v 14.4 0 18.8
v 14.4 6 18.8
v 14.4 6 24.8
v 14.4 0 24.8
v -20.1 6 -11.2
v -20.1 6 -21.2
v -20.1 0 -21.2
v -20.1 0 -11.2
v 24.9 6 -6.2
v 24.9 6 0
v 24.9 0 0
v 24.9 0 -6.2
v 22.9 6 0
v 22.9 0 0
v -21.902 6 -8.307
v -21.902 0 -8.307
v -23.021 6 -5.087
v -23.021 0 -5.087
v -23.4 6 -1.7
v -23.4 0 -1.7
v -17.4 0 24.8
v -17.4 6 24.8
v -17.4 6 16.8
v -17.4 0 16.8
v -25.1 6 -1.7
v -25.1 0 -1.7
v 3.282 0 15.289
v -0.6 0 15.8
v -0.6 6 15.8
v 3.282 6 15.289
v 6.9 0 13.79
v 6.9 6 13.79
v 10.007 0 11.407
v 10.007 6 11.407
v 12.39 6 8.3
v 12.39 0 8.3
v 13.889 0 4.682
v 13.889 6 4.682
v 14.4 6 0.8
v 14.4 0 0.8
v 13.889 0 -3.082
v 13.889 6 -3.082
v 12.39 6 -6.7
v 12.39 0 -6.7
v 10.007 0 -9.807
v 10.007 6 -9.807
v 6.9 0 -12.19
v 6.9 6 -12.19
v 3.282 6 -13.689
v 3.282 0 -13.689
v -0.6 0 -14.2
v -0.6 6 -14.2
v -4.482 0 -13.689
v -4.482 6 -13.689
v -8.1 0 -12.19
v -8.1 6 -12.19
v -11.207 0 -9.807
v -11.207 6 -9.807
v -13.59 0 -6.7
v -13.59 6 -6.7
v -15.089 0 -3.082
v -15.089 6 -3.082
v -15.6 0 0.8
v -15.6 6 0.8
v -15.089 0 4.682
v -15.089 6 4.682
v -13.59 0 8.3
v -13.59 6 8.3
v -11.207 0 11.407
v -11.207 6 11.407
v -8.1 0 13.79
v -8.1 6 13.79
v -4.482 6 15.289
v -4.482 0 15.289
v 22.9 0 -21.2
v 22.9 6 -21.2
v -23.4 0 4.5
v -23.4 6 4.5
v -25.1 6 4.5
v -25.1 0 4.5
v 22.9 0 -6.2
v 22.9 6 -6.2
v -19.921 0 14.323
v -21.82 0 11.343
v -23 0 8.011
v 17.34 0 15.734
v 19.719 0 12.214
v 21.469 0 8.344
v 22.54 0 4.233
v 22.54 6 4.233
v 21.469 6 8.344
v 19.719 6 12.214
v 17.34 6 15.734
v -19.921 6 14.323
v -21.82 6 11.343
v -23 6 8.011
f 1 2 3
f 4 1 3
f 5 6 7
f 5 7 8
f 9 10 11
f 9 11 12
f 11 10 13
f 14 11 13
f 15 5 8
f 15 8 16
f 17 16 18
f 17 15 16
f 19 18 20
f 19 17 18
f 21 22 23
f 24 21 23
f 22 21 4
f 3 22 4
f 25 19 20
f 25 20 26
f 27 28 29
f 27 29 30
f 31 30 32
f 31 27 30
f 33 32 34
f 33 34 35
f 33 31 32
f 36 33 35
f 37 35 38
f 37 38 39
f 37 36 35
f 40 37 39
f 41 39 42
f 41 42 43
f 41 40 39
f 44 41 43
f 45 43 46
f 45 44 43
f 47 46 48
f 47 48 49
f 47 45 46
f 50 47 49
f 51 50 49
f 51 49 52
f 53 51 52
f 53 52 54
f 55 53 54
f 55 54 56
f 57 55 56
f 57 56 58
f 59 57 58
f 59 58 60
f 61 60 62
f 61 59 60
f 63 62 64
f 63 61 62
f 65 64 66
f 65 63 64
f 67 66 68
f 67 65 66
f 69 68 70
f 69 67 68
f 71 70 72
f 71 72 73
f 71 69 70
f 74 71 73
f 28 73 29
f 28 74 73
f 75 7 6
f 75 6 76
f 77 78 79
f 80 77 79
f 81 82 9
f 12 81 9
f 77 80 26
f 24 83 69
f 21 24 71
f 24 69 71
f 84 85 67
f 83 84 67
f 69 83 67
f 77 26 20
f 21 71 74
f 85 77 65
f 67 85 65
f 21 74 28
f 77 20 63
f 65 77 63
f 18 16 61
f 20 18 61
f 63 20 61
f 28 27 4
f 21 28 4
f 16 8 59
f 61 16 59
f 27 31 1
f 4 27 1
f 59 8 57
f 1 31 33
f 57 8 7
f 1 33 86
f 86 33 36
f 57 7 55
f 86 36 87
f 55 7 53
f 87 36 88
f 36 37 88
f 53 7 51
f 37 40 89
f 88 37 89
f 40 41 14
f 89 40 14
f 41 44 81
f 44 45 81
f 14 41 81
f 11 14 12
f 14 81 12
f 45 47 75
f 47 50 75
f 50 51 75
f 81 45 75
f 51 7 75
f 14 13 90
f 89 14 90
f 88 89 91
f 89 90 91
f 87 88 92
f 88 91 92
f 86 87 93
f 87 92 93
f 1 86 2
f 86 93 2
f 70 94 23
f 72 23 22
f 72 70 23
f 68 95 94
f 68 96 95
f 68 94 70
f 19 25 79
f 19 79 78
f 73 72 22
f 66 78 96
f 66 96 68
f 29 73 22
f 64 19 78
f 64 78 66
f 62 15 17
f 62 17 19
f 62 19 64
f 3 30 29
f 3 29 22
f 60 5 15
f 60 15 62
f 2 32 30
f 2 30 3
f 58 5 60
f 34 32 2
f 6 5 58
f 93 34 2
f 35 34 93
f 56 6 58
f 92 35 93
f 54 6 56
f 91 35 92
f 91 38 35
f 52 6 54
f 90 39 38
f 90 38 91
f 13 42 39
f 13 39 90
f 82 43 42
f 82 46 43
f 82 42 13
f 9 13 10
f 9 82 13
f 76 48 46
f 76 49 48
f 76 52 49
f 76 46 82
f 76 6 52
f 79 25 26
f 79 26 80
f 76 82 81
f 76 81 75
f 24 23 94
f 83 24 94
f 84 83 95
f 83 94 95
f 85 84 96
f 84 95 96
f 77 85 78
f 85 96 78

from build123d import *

# Parameters (mm, degrees)
SKETCH1_W           = 62.8
SKETCH1_H           = 46
SKETCH1_R           = 1.4
SKETCH1_R_2         = 15
BOSS_EXTRUDE1_DEPTH = 6
SKETCH2_W           = 8.5
SKETCH2_H           = 15
CUT_EXTRUDE1_DEPTH  = 41.459856648
FILLET1_R           = 3.1
CUT_EXTRUDE2_DEPTH  = 41.459856648


with BuildPart() as part:
    # Sketch1 → Boss-Extrude1 (new body)
    with BuildSketch(Plane(origin=(0, 0, 0), x_dir=(1, 0, 0), z_dir=(0, 1, 0))):
        with Locations((0, -1.8)):
            Rectangle(SKETCH1_W, SKETCH1_H)
        with Locations(Location((-28.3, -1.4, 0), (0, 0, 270))):
            Circle(SKETCH1_R, mode=Mode.SUBTRACT)
        with Locations(Location((28.3, 3.1, 0), (0, 0, 270))):
            Circle(SKETCH1_R, mode=Mode.SUBTRACT)
        with Locations(Location((-0.6, -0.8, 0), (0, 0, 270))):
            Circle(SKETCH1_R_2, mode=Mode.SUBTRACT)
    extrude(amount=BOSS_EXTRUDE1_DEPTH)

    # Sketch2 → Cut-Extrude1 (cut, through all)
    with BuildSketch(Plane(origin=(0, 6, 0), x_dir=(1, 0, 0), z_dir=(0, 1, 0))):
        with Locations((27.15, 13.7)):
            Rectangle(SKETCH2_W, SKETCH2_H)
        with BuildLine():
            Line((14.4, -24.8), (31.4, -24.8))
            Line((31.4, -24.8), (31.4, 0))
            Line((31.4, 0), (22.9, 0))
            ThreePointArc((22.9, 0), (20.676259907, -10.31612815), (14.4, -18.8))
            Line((14.4, -18.8), (14.4, -24.8))
        make_face()
        with BuildLine():
            Line((-17.4, -24.8), (-17.4, -16.8))
            ThreePointArc((-17.4, -16.8), (-21.820028515, -11.342696837), (-23.4, -4.5))
            Line((-23.4, -4.5), (-31.4, -4.5))
            Line((-31.4, -4.5), (-31.4, -24.8))
            Line((-31.4, -24.8), (-17.4, -24.8))
        make_face()
        with BuildLine():
            Line((-20.1, 21.2), (-20.1, 11.2))
            ThreePointArc((-20.1, 11.2), (-22.551509918, 6.728419235), (-23.4, 1.7))
            Line((-23.4, 1.7), (-31.4, 1.7))
            Line((-31.4, 1.7), (-31.4, 21.2))
            Line((-31.4, 21.2), (-20.1, 21.2))
        make_face()
    extrude(amount=-CUT_EXTRUDE1_DEPTH, mode=Mode.SUBTRACT)

    # Fillet1
    fillet1_edges = [part.edges().sort_by_distance(p)[0] for p in [
        (-31.4, 3, 4.5),
        (-31.4, 3, -1.7),
        (31.4, 3, -6.2),
        (31.4, 3, 0),
    ]]
    fillet(fillet1_edges, radius=FILLET1_R - 0.0001)  # a hair under: the kernel refuses the full size

    # Sketch3 → Cut-Extrude2 (cut, through all)
    with BuildSketch(Plane(origin=(0, 6, 0), x_dir=(1, 0, 0), z_dir=(0, 1, 0))):
        with BuildLine():
            Line((28.3, 0), (24.9, 0))
            Line((24.9, 0), (24.9, 6.2))
            Line((24.9, 6.2), (28.3, 6.2))
            ThreePointArc((28.3, 6.2), (30.492031022, 5.292031022), (31.4, 3.1))
            ThreePointArc((31.4, 3.1), (30.492031022, 0.907968978), (28.3, 0))
        make_face()
        with BuildLine():
            Line((-25.1, -4.5), (-28.3, -4.5))
            ThreePointArc((-28.3, -4.5), (-30.492031022, -3.592031022), (-31.4, -1.4))
            ThreePointArc((-31.4, -1.4), (-30.492031022, 0.792031022), (-28.3, 1.7))
            Line((-28.3, 1.7), (-25.1, 1.7))
            Line((-25.1, 1.7), (-25.1, -4.5))
        make_face()
    extrude(amount=-CUT_EXTRUDE2_DEPTH, mode=Mode.SUBTRACT)


with BuildPart() as cut_extrude2_kept_piece:
    # of the separate pieces the step leaves, the one the design keeps (cut_extrude2_pieces_kept)
    add(part.part.solids().sort_by_distance((-23.4, 0, 4.5))[0])


solid = cut_extrude2_kept_piece.part
